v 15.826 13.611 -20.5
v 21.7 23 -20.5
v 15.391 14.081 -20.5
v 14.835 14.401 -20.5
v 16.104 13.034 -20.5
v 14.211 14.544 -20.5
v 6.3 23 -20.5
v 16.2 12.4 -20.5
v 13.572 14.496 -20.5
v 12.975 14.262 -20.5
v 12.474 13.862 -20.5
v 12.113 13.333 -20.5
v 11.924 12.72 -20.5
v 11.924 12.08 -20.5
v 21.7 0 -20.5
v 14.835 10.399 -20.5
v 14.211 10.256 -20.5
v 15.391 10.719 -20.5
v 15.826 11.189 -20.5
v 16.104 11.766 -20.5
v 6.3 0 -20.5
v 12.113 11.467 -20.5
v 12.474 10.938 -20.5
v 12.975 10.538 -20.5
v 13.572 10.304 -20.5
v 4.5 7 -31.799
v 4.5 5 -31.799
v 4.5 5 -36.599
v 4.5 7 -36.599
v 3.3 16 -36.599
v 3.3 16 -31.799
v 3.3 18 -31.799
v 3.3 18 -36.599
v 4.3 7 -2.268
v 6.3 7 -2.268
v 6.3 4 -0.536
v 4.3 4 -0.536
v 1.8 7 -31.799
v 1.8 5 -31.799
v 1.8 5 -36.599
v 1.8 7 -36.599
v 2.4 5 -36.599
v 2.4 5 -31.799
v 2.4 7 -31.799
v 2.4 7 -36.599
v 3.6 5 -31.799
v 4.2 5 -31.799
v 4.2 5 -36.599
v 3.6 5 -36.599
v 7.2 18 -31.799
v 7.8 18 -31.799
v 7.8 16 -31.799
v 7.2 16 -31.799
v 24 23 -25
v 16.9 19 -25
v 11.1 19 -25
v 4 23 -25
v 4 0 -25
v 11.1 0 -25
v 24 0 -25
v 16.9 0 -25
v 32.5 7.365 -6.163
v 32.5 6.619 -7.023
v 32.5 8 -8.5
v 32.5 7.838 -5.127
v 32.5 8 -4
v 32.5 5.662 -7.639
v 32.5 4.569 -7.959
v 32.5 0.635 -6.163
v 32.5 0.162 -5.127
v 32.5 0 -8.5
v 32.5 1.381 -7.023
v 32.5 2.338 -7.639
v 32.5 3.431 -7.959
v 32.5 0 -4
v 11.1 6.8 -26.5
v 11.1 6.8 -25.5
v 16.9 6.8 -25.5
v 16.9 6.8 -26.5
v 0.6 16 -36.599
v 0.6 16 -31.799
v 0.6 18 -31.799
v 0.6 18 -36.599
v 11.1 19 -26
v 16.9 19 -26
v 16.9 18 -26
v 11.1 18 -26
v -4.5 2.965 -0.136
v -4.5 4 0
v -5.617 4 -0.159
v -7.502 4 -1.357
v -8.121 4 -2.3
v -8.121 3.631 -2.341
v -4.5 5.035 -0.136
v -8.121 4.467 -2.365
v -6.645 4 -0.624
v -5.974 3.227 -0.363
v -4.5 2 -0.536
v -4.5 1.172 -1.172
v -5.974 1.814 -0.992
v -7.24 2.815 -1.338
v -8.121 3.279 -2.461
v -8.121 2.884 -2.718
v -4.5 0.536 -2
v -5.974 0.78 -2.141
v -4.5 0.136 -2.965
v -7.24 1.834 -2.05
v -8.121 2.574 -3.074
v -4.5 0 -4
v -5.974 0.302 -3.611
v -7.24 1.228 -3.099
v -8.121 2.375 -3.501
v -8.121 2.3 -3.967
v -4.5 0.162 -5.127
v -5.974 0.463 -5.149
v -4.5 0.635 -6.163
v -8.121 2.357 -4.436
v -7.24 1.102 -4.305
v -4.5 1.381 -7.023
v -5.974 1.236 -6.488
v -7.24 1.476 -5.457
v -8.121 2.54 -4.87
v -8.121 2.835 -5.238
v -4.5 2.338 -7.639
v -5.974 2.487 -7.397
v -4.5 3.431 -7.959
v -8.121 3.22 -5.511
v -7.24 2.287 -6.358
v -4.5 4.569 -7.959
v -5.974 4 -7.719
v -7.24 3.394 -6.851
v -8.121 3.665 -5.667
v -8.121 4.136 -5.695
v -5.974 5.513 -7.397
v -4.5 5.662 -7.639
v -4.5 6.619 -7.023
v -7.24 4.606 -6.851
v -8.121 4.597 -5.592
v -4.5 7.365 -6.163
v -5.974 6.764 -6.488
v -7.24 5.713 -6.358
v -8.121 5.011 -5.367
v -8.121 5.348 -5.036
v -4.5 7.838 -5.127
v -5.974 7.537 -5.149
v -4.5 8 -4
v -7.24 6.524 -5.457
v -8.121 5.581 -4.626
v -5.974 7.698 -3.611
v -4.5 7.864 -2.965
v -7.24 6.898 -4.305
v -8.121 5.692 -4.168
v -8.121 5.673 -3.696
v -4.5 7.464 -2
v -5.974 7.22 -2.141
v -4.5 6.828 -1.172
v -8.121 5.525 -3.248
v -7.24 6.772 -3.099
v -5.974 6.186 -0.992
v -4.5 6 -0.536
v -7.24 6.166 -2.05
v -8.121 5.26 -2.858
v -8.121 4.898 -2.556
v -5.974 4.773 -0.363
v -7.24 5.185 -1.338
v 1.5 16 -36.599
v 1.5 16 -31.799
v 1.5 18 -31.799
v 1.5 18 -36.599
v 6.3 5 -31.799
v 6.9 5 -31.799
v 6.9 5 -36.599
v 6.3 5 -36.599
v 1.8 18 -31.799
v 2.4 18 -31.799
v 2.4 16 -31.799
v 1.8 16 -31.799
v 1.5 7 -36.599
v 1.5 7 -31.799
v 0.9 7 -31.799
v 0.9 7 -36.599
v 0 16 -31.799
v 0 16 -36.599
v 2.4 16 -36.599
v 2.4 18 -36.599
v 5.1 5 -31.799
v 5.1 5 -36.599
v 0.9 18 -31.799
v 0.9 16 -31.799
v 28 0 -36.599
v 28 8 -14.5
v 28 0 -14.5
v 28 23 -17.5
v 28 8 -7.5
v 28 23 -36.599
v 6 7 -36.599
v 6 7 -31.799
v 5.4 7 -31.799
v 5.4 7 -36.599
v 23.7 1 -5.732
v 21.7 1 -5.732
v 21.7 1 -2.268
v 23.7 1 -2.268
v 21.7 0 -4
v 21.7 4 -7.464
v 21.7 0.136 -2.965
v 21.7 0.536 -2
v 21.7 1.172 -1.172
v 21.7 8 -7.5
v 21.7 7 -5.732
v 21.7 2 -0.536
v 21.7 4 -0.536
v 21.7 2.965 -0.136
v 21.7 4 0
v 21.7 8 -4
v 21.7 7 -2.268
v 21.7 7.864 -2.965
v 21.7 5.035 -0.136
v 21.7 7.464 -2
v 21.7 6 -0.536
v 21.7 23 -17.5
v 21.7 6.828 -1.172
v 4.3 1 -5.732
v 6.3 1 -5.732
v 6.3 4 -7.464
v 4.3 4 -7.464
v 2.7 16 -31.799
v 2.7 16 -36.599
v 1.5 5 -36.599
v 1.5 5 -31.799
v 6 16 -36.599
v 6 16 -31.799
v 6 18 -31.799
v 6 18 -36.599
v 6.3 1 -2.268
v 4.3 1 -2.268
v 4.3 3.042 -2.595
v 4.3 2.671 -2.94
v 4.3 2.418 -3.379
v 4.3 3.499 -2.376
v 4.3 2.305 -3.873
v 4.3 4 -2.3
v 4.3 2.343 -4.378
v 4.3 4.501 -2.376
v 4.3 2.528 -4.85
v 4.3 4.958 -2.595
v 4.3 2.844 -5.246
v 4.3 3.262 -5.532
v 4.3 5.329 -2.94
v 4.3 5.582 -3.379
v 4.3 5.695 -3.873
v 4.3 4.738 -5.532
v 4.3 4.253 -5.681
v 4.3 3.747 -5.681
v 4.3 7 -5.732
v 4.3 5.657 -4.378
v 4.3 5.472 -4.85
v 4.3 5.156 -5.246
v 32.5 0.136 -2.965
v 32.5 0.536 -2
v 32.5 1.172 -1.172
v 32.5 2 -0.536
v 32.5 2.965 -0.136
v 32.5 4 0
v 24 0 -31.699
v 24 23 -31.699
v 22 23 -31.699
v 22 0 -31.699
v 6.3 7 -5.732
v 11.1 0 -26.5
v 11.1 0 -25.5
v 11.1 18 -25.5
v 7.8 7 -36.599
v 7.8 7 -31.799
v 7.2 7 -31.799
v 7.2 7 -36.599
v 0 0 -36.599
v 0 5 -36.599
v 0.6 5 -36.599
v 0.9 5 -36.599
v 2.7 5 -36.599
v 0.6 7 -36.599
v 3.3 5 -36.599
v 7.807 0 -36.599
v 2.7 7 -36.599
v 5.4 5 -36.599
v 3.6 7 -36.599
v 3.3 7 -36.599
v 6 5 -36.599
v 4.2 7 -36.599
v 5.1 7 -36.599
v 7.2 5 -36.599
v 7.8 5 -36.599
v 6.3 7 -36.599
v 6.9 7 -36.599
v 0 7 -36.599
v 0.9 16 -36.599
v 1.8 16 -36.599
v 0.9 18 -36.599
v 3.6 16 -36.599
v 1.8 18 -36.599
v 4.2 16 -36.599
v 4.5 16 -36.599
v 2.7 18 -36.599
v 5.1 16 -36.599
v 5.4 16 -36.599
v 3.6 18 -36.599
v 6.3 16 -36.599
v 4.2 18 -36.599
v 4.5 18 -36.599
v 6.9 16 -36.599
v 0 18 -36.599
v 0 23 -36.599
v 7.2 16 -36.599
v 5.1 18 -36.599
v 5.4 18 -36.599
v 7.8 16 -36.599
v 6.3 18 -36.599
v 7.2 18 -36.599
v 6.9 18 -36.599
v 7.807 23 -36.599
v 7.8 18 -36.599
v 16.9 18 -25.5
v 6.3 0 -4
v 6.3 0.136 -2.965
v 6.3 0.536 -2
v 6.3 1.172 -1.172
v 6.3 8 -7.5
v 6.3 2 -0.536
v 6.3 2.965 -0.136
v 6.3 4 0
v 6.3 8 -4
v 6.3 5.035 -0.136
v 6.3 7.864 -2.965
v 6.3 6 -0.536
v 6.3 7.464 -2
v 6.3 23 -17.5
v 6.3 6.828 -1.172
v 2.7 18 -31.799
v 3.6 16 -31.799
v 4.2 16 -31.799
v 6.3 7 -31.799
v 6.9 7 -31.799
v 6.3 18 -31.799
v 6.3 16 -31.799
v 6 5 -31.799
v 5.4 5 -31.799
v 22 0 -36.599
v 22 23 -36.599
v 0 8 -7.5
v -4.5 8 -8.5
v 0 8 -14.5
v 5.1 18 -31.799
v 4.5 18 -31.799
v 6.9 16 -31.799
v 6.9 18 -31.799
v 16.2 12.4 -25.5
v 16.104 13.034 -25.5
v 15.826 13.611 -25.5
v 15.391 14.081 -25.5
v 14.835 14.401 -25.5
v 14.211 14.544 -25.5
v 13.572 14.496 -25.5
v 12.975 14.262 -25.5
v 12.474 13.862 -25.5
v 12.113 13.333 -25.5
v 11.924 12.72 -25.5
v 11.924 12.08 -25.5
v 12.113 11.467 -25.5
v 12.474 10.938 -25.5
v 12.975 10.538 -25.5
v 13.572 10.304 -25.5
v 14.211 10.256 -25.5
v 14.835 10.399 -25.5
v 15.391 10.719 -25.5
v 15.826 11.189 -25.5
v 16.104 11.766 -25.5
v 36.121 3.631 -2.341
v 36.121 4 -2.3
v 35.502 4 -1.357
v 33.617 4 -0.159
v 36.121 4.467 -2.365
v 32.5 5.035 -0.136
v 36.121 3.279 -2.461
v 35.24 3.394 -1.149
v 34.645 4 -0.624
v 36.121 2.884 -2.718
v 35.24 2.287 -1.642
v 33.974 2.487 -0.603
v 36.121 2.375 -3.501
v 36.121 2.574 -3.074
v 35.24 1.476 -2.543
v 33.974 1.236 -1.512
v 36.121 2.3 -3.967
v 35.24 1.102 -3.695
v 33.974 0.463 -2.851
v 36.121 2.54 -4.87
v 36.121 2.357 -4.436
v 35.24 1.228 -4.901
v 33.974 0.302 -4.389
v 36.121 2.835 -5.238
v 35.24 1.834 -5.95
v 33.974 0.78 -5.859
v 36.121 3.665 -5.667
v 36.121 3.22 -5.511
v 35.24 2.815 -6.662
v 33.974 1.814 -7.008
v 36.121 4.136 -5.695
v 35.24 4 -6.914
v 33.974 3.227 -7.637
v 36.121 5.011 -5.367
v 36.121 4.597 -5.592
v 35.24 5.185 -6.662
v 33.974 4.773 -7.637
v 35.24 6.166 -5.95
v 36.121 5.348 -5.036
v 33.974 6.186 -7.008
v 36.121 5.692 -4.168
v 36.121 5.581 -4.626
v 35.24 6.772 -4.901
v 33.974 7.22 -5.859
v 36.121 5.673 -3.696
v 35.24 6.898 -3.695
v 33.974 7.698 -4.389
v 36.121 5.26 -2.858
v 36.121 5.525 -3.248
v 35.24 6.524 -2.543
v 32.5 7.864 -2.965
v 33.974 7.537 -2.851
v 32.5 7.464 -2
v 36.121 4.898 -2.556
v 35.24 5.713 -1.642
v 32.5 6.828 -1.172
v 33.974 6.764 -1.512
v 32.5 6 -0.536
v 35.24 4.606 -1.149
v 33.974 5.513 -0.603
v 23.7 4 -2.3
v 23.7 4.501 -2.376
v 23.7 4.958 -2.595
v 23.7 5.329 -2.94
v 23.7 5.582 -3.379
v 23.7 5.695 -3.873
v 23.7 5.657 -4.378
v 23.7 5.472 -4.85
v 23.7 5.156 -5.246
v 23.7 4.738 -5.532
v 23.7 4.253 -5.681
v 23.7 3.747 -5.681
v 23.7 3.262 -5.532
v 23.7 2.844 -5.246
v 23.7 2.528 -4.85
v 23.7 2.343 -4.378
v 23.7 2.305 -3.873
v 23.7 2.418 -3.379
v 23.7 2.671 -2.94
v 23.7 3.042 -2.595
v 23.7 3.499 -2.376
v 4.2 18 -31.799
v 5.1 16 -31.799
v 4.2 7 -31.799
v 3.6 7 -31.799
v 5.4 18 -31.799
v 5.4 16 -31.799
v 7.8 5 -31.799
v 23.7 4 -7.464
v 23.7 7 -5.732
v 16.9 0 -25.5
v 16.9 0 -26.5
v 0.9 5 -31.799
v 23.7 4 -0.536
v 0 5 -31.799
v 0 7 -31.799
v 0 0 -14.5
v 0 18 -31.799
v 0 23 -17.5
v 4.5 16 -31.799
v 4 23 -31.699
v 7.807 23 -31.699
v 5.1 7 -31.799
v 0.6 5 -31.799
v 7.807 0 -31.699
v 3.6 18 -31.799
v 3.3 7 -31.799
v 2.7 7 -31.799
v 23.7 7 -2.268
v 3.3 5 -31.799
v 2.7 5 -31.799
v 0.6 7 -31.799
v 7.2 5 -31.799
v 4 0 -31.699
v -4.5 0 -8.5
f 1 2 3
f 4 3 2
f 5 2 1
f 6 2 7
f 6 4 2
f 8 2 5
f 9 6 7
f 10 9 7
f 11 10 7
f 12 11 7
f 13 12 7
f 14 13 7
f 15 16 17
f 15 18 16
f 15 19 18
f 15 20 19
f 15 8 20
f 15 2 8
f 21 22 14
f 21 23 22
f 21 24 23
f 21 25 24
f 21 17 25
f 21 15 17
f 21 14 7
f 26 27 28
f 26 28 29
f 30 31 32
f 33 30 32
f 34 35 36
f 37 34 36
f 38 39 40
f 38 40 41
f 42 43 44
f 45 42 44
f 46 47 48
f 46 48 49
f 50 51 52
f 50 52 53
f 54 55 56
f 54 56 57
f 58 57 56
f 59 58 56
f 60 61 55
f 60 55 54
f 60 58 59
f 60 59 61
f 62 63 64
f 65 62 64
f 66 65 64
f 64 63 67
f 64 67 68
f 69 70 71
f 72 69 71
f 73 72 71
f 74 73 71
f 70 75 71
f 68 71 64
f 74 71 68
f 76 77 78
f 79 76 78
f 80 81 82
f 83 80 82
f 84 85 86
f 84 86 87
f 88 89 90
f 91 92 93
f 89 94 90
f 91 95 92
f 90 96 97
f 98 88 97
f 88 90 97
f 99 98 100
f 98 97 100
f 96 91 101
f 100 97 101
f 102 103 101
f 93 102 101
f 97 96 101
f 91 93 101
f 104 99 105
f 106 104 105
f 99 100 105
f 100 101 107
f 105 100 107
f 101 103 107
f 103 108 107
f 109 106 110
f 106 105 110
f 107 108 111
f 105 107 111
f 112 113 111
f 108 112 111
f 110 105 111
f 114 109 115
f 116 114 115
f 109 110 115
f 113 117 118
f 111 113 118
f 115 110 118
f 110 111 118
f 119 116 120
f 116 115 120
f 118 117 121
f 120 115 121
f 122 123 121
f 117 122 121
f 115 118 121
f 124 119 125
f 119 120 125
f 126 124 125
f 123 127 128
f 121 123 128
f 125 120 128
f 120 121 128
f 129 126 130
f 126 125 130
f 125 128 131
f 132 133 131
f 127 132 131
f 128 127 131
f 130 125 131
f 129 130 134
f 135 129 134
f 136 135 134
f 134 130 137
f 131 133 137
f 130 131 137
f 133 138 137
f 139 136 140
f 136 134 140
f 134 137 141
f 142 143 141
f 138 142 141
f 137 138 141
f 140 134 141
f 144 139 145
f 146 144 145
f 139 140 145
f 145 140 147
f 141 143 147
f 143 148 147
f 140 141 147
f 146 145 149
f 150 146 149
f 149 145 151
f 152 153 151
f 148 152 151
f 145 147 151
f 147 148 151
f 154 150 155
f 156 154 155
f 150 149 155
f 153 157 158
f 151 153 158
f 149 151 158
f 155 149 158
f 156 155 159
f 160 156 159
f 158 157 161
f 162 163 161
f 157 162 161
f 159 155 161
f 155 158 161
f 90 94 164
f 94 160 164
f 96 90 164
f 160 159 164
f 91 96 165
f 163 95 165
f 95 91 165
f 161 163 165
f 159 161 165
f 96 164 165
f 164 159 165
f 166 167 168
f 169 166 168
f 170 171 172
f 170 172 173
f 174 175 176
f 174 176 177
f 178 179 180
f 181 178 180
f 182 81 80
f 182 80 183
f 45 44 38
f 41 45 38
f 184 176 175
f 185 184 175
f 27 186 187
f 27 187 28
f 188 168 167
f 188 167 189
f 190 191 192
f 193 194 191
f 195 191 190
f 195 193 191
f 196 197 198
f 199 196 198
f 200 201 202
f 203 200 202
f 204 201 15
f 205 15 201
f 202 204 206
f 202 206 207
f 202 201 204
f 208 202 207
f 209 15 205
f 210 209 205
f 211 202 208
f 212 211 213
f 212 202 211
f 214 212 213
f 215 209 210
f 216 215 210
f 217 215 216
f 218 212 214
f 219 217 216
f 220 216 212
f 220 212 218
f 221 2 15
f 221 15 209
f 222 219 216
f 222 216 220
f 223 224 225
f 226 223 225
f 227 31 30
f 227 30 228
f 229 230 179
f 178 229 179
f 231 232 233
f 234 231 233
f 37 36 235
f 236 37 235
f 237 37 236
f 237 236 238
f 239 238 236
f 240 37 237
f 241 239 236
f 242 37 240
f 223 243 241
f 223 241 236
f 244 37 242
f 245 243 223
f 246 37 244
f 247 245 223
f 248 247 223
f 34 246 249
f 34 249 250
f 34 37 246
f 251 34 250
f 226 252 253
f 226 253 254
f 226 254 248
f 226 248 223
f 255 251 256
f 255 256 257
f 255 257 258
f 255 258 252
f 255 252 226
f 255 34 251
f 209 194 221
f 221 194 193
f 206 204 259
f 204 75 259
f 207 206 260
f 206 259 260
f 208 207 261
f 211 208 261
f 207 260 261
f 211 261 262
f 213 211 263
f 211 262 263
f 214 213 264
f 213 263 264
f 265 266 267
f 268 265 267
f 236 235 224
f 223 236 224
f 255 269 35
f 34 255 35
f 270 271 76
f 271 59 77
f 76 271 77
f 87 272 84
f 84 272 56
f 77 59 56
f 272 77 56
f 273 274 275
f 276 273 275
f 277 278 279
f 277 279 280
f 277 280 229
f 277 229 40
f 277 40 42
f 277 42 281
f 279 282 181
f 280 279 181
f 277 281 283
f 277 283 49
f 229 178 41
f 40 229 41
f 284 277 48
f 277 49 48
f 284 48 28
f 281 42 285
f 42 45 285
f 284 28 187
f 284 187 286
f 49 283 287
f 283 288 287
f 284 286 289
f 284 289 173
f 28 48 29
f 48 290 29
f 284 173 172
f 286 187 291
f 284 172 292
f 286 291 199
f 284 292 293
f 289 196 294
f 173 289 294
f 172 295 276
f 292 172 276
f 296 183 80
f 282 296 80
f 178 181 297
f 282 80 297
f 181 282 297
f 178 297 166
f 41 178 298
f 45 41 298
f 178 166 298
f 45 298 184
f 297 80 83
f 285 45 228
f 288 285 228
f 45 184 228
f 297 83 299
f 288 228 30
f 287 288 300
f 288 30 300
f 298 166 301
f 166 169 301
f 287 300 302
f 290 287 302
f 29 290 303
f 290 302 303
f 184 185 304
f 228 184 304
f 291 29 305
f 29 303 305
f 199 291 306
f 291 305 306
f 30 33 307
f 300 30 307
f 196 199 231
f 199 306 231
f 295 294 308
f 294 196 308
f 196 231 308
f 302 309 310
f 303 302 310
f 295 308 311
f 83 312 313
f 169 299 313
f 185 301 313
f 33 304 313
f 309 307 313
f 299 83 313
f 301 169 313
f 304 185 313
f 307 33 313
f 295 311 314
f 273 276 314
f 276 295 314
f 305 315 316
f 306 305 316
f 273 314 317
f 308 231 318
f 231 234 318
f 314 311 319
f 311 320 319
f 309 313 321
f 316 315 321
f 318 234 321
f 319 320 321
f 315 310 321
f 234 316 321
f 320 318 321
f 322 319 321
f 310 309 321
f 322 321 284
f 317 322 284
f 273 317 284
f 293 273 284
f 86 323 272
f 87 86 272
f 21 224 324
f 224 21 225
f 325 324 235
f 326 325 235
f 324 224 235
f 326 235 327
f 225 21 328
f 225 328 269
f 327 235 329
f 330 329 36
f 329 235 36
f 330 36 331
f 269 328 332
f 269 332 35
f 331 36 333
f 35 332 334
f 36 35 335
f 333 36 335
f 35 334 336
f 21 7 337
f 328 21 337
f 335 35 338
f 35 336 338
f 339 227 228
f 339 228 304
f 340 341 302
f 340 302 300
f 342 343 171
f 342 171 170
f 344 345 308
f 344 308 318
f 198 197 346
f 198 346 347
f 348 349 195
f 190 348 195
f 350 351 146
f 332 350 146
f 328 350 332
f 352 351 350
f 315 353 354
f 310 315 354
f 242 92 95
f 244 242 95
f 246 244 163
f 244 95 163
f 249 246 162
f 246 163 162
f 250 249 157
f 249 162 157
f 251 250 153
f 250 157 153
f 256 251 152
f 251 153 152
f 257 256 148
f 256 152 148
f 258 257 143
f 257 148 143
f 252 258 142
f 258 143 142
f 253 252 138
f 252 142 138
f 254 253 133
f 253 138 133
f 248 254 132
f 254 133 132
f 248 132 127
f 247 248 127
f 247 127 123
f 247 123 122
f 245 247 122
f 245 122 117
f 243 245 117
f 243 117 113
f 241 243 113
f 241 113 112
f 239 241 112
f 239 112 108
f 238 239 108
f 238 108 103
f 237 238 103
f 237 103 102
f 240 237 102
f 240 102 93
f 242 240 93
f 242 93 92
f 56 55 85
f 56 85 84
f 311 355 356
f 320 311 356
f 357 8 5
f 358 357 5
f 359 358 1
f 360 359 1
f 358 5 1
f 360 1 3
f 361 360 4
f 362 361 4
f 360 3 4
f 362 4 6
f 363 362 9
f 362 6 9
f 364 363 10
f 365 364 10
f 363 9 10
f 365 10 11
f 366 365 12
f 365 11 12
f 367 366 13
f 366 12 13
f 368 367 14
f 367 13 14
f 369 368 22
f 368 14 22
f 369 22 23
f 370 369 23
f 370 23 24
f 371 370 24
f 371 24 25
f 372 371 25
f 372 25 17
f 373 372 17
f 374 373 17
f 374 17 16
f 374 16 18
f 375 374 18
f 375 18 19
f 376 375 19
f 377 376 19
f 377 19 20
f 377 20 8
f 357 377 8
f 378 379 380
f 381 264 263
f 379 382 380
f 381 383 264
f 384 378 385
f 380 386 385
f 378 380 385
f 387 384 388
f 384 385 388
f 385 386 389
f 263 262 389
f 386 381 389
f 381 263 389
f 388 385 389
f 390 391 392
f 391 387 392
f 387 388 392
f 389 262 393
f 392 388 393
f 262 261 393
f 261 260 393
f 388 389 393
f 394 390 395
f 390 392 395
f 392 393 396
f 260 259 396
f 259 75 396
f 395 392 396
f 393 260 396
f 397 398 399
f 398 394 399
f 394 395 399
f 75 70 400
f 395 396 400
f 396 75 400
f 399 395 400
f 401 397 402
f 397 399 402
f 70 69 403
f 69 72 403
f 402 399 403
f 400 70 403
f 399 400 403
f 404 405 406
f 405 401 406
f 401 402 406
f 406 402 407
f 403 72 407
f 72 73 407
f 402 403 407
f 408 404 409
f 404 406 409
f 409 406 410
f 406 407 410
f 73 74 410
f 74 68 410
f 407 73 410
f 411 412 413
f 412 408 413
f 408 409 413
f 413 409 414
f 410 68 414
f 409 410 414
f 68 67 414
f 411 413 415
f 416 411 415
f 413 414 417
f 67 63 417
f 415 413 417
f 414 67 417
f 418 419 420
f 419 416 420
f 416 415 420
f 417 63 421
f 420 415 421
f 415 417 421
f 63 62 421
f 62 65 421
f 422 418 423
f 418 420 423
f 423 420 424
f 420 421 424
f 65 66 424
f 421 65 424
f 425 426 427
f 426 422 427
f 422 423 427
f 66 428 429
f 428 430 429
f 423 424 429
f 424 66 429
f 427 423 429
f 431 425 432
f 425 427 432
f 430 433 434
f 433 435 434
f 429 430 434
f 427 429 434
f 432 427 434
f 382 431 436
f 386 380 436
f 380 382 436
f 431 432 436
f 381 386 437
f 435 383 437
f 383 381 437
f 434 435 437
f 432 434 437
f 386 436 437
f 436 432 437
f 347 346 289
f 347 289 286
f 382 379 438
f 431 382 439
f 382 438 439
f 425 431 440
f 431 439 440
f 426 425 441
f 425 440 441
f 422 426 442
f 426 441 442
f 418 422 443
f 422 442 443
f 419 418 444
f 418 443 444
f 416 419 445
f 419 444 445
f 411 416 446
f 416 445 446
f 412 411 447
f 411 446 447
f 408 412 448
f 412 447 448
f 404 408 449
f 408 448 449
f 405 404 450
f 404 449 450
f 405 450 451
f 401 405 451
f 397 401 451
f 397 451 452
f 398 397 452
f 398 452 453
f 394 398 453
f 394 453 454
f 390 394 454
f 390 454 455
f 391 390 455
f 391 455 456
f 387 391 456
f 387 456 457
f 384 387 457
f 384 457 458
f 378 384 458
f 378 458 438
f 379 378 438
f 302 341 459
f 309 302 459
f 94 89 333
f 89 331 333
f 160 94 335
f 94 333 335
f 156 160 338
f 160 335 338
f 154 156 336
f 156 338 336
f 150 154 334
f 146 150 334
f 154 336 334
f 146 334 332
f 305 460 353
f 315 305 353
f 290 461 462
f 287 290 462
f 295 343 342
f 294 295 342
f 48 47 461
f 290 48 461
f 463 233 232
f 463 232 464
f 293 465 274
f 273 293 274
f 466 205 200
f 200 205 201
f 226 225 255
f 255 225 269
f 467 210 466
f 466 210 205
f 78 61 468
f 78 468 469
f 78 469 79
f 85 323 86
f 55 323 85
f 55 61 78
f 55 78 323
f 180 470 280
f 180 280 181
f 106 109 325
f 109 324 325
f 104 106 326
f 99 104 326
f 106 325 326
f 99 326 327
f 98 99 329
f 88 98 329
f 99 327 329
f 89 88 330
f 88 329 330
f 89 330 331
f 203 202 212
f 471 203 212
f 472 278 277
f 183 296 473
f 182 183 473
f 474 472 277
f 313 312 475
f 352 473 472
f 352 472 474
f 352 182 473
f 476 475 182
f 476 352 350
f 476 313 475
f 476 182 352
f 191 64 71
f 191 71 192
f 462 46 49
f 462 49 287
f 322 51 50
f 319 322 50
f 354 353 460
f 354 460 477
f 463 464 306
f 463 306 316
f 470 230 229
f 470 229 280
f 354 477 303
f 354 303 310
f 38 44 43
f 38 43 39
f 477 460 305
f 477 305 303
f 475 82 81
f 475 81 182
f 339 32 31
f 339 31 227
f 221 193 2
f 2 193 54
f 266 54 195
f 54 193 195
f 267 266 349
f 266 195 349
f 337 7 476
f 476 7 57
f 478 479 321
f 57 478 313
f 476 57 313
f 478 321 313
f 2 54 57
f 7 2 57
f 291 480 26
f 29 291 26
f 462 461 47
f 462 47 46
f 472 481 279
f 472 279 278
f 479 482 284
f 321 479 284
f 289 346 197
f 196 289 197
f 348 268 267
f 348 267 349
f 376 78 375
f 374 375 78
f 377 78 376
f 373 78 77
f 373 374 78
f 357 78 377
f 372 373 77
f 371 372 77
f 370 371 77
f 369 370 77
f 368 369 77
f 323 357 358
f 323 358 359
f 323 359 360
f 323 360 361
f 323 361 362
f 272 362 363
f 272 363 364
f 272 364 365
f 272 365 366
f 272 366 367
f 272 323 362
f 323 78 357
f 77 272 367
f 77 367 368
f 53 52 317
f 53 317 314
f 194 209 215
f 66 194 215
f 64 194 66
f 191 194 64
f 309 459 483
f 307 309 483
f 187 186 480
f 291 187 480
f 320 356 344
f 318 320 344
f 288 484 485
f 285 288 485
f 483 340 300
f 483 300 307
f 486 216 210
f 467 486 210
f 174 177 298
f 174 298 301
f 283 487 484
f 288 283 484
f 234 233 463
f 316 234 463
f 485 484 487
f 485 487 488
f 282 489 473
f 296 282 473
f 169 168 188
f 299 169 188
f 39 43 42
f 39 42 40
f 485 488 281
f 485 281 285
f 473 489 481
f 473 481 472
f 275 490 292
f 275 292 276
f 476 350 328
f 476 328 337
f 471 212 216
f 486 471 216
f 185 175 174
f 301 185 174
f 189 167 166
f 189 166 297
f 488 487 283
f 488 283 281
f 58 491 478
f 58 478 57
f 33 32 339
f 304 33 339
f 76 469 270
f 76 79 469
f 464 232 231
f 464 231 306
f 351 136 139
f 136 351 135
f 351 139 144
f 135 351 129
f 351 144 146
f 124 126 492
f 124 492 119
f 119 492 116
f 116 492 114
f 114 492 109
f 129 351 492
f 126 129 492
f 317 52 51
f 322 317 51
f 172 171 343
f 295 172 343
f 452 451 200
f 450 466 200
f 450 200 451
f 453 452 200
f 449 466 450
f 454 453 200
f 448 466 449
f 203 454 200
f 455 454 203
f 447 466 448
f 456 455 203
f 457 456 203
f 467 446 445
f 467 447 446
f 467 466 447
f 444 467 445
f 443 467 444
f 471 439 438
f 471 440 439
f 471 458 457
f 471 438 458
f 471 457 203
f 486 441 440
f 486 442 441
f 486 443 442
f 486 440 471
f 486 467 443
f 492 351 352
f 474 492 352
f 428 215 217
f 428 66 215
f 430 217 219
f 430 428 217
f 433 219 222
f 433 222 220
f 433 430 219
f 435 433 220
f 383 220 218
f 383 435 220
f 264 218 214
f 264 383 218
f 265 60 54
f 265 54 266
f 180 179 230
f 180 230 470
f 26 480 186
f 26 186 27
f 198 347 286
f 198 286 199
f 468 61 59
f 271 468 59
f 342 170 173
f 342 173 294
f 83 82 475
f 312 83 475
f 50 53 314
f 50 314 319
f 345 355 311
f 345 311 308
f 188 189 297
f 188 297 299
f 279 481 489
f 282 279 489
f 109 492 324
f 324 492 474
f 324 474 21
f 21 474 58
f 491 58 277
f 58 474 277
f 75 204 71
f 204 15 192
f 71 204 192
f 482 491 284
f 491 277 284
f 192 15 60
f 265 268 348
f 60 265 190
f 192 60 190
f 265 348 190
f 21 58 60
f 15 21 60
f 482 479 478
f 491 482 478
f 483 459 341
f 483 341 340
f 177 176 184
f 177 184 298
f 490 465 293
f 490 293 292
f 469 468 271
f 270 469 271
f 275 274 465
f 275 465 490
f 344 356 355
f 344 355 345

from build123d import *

# Parameters (mm, degrees)
BOSS_EXTRUDE1_DEPTH      = 8
BOSS_EXTRUDE2_DEPTH      = 15
BOSS_EXTRUDE4_DEPTH      = 6.3
BOSS_EXTRUDE5_DEPTH      = 6.3
SKETCH7_R                = 1.7
ENL_V_MAT_EXTRU_14_DEPTH = 62.473571557
SKETCH8_W                = 5.8
SKETCH8_H                = 18
BOSS_EXTRU_3_DEPTH       = 0.5
ESQUISSE5_R              = 2.15
ENL_V_MAT_EXTRU_5_DEPTH  = 48.765049984
ESQUISSE9_W              = 28
ESQUISSE9_H              = 5.300857061
ENL_V_MAT_EXTRU_9_DEPTH  = 56.554027757
BOSS_EXTRU_4_DEPTH       = 1
ESQUISSE11_W             = 5.8
ESQUISSE11_H             = 1
BOSS_EXTRU_5_DEPTH       = 1
ESQUISSE14_W             = 6
ESQUISSE14_H             = 5.9
ESQUISSE14_W_2           = 9
BOSS_EXTRU_7_DEPTH       = 23
ESQUISSE15_W             = 0.6
ESQUISSE15_H             = 2
ENL_V_MAT_EXTRU_12_DEPTH = 5.8
ESQUISSE17_W             = 1.2
ESQUISSE17_H             = 5.9
ENL_V_MAT_EXTRU_13_DEPTH = 27
ESQUISSE16_W             = 28
ESQUISSE16_H             = 1
ENL_V_MAT_EXTRU_11_DEPTH = 23
CONG_3_R                 = 4
ENL_V_MAT_EXTRU_15_DEPTH = 2
ENL_V_MAT_EXTRU_16_DEPTH = 2
BOSS_EXTRU_8_DEPTH       = 8


with BuildPart() as part:
    # Sketch1 → Boss-Extrude1 (new body)
    with BuildSketch(Plane(origin=(0, 0, 0), x_dir=(1, 0, 0), z_dir=(0, 1, 0))):
        Polygon((6.3, 0), (6.3, 20.5), (12.5, 20.5), (15.5, 20.5), (21.7, 20.5), (21.7, 0), (28, 0), (36.5, 0), (36.5, 8.5), (28, 8.5), (28, 35), (22, 35), (22, 32), (24, 32), (24, 25), (4, 25), (4, 32), (8, 32), (8, 35), (0, 35), (0, 8.5), (-8.5, 8.5), (-8.5, 0), (0, 0), align=None)
    extrude(amount=BOSS_EXTRUDE1_DEPTH)

    # Sketch2 → Boss-Extrude2 (add)
    with BuildSketch(Plane(origin=(0, 8, 0), x_dir=(1, 0, 0), z_dir=(0, 1, 0))):
        Polygon((8, 35), (8, 32), (4, 32), (4, 25), (24, 25), (24, 32), (22, 32), (22, 35), (28, 35), (28, 20.5), (0, 20.5), (0, 35), align=None)
    extrude(amount=BOSS_EXTRUDE2_DEPTH)

    # Sketch4 → Boss-Extrude4 (add)
    with BuildSketch(Plane.ZY):
        Polygon((-17.5, 23), (-20.5, 23), (-20.5, 8), (-7.5, 8), align=None)
    extrude(amount=-BOSS_EXTRUDE4_DEPTH)

    # Sketch5 → Boss-Extrude5 (add)
    with BuildSketch(Plane(origin=(28, 0, 0), x_dir=(0, 0, -1), z_dir=(1, 0, 0))):
        Polygon((20.5, 8), (7.5, 8), (17.5, 23), (20.5, 23), align=None)
    extrude(amount=-BOSS_EXTRUDE5_DEPTH)

    # Sketch7 → Enlèv. mat.-Extru.14 (cut, through all)
    with BuildSketch(Plane.ZY.offset(8.5)):
        with Locations((-4, 4)):
            Circle(SKETCH7_R)
    extrude(amount=-ENL_V_MAT_EXTRU_14_DEPTH, mode=Mode.SUBTRACT)

    # Sketch8 → Boss.-Extru.3 (add)
    with BuildSketch(Plane(origin=(0, 0, -25), x_dir=(-1, 0, 0), z_dir=(0, 0, -1))):
        with Locations((-14, 9.000007445)):
            Rectangle(SKETCH8_W, SKETCH8_H)
    extrude(amount=BOSS_EXTRU_3_DEPTH)

    # Esquisse5 → Enlèv. mat.-Extru.5 (cut, through all)
    with BuildSketch(Plane.XY.offset(-20.5)):
        with Locations((14.05, 12.4)):
            Circle(ESQUISSE5_R)
    extrude(amount=-ENL_V_MAT_EXTRU_5_DEPTH, mode=Mode.SUBTRACT)

    # Esquisse9 → Enlèv. mat.-Extru.9 (cut, through all)
    with BuildSketch(Plane(origin=(0, 23, 0), x_dir=(1, 0, 0), z_dir=(0, 1, 0))):
        with Locations((14, 34.349571469)):
            Rectangle(ESQUISSE9_W, ESQUISSE9_H)
    extrude(amount=-ENL_V_MAT_EXTRU_9_DEPTH, mode=Mode.SUBTRACT)

    # Esquisse10 → Boss.-Extru.4 (add)
    with BuildSketch(Plane(origin=(0, 0, -25.5), x_dir=(-1, 0, 0), z_dir=(0, 0, -1))):
        Polygon((-16.9, 7.445e-06), (-11.1, 0), (-11.1, 6.800007445), (-16.9, 6.800007445), align=None)
    extrude(amount=BOSS_EXTRU_4_DEPTH)

    # Esquisse11 → Boss.-Extru.5 (add)
    with BuildSketch(Plane(origin=(0, 0, -25), x_dir=(-1, 0, 0), z_dir=(0, 0, -1))):
        with Locations((-14, 18.500007445)):
            Rectangle(ESQUISSE11_W, ESQUISSE11_H)
    extrude(amount=BOSS_EXTRU_5_DEPTH)

    # Esquisse14 → Boss.-Extru.7 (add)
    with BuildSketch(Plane(origin=(0, 23, -10.399142939), x_dir=(-1, 0, 0), z_dir=(0, -1, 0))):
        with Locations((-25, 24.25)):
            Rectangle(ESQUISSE14_W, ESQUISSE14_H)
        with Locations((-4.5, 24.25)):
            Rectangle(ESQUISSE14_W_2, ESQUISSE14_H)
    extrude(amount=BOSS_EXTRU_7_DEPTH)

    # Esquisse15 → Enlèv. mat.-Extru.12 (cut)
    with BuildSketch(Plane(origin=(0, 0, -37.599142939), x_dir=(-1, 0, 0), z_dir=(0, 0, -1))):
        with Locations((-7.5, 17)):
            Rectangle(ESQUISSE15_W, ESQUISSE15_H)
        with Locations((-6.6, 17)):
            Rectangle(ESQUISSE15_W, ESQUISSE15_H)
        with Locations((-5.7, 17)):
            Rectangle(ESQUISSE15_W, ESQUISSE15_H)
        with Locations((-8.4, 17)):
            Rectangle(ESQUISSE15_W, ESQUISSE15_H)
        with Locations((-8.4, 6)):
            Rectangle(ESQUISSE15_W, ESQUISSE15_H)
        with Locations((-0.3, 6)):
            Rectangle(ESQUISSE15_W, ESQUISSE15_H)
        with Locations((-0.3, 17)):
            Rectangle(ESQUISSE15_W, ESQUISSE15_H)
        with Locations((-4.8, 17)):
            Rectangle(ESQUISSE15_W, ESQUISSE15_H)
        with Locations((-3.9, 17)):
            Rectangle(ESQUISSE15_W, ESQUISSE15_H)
        with Locations((-7.5, 6)):
            Rectangle(ESQUISSE15_W, ESQUISSE15_H)
        with Locations((-3, 17)):
            Rectangle(ESQUISSE15_W, ESQUISSE15_H)
        with Locations((-2.1, 17)):
            Rectangle(ESQUISSE15_W, ESQUISSE15_H)
        with Locations((-6.6, 6)):
            Rectangle(ESQUISSE15_W, ESQUISSE15_H)
        with Locations((-1.2, 17)):
            Rectangle(ESQUISSE15_W, ESQUISSE15_H)
        with Locations((-5.7, 6)):
            Rectangle(ESQUISSE15_W, ESQUISSE15_H)
        with Locations((-4.8, 6)):
            Rectangle(ESQUISSE15_W, ESQUISSE15_H)
        with Locations((-3.9, 6)):
            Rectangle(ESQUISSE15_W, ESQUISSE15_H)
        with Locations((-3, 6)):
            Rectangle(ESQUISSE15_W, ESQUISSE15_H)
        with Locations((-2.1, 6)):
            Rectangle(ESQUISSE15_W, ESQUISSE15_H)
        with Locations((-1.2, 6)):
            Rectangle(ESQUISSE15_W, ESQUISSE15_H)
    extrude(amount=-ENL_V_MAT_EXTRU_12_DEPTH, mode=Mode.SUBTRACT)

    # Esquisse17 → Enlèv. mat.-Extru.13 (cut)
    with BuildSketch(Plane(origin=(0, 23, 0), x_dir=(1, 0, 0), z_dir=(0, 1, 0))):
        with Locations((8.407063975, 34.649142939)):
            Rectangle(ESQUISSE17_W, ESQUISSE17_H)
    extrude(amount=-ENL_V_MAT_EXTRU_13_DEPTH, mode=Mode.SUBTRACT)

    # Esquisse16 → Enlèv. mat.-Extru.11 (cut)
    with BuildSketch(Plane(origin=(0, 23, 0), x_dir=(1, 0, 0), z_dir=(0, 1, 0))):
        with Locations((14, 37.099142939)):
            Rectangle(ESQUISSE16_W, ESQUISSE16_H)
    extrude(amount=-ENL_V_MAT_EXTRU_11_DEPTH, mode=Mode.SUBTRACT)

    # Esquisse23 → Enlèvement de matière-Révolution11 (revolve, cut)
    with BuildSketch(Plane(origin=(0, 0, -4), x_dir=(-1, 0, 0), z_dir=(0, 0, -1)), mode=Mode.PRIVATE) as enl_vement_de_mati_re_r_volution11_sk:
        with BuildLine():
            Line((-32.5, 8), (-32.5, 11.823143252))
            Line((-32.5, 11.823143252), (-33.950094463, 11.823143252))
            Line((-33.950094463, 11.823143252), (-37.601757894, 11.944869061))
            Line((-37.601757894, 11.944869061), (-40.320792242, 4))
            Line((-40.320792242, 4), (-36.5, 4))
            ThreePointArc((-36.5, 4), (-35.328427125, 6.828427125), (-32.5, 8))
        make_face()
        with BuildLine():
            Line((8.5, 4), (12.320792242, 4))
            Line((12.320792242, 4), (9.601757894, 11.944869061))
            Line((9.601757894, 11.944869061), (5.950094463, 11.823143252))
            Line((5.950094463, 11.823143252), (4.5, 11.823143252))
            Line((4.5, 11.823143252), (4.5, 8))
            ThreePointArc((4.5, 8), (7.328427125, 6.828427125), (8.5, 4))
        make_face()
    revolve(enl_vement_de_mati_re_r_volution11_sk.sketch.rotate(Axis((36.5, 4, -4), (1, 0, 0)), 90), axis=Axis((36.5, 4, -4), (1, 0, 0)), mode=Mode.SUBTRACT)

    # Congé3
    cong_3_edges = [part.edges().sort_by_distance(p)[0] for p in [
        (27.1, 0, 0),
        (27.1, 8, 0),
        (0.9, 0, 0),
        (0.9, 8, 0),
    ]]
    fillet(cong_3_edges, radius=CONG_3_R - 0.0001)  # a hair under: the kernel refuses the full size

    # Esquisse26 → Enlèv. mat.-Extru.15 (cut)
    with BuildSketch(Plane.ZY.offset(-21.7)):
        Polygon((-0.535898385, 4), (-2.267949192, 7), (-5.732050808, 7), (-7.464101615, 4), (-5.732050808, 1), (-2.267949192, 1), align=None)
    extrude(amount=-ENL_V_MAT_EXTRU_15_DEPTH, mode=Mode.SUBTRACT)

    # Esquisse27 → Enlèv. mat.-Extru.16 (cut)
    with BuildSketch(Plane(origin=(6.3, 0, 0), x_dir=(0, 0, -1), z_dir=(1, 0, 0))):
        Polygon((7.464101615, 4), (5.732050808, 7), (2.267949192, 7), (0.535898385, 4), (2.267949192, 1), (5.732050808, 1), align=None)
    extrude(amount=-ENL_V_MAT_EXTRU_16_DEPTH, mode=Mode.SUBTRACT)

    # Esquisse28 → Boss.-Extru.8 (add)
    with BuildSketch(Plane(origin=(0, 8, 0), x_dir=(1, 0, 0), z_dir=(0, 1, 0))):
        Polygon((28, 8.5), (32.5, 8.5), (28, 14.5), align=None)
        Polygon((-4.5, 8.5), (0, 14.5), (0, 8.5), align=None)
    extrude(amount=-BOSS_EXTRU_8_DEPTH)


solid = part.part
